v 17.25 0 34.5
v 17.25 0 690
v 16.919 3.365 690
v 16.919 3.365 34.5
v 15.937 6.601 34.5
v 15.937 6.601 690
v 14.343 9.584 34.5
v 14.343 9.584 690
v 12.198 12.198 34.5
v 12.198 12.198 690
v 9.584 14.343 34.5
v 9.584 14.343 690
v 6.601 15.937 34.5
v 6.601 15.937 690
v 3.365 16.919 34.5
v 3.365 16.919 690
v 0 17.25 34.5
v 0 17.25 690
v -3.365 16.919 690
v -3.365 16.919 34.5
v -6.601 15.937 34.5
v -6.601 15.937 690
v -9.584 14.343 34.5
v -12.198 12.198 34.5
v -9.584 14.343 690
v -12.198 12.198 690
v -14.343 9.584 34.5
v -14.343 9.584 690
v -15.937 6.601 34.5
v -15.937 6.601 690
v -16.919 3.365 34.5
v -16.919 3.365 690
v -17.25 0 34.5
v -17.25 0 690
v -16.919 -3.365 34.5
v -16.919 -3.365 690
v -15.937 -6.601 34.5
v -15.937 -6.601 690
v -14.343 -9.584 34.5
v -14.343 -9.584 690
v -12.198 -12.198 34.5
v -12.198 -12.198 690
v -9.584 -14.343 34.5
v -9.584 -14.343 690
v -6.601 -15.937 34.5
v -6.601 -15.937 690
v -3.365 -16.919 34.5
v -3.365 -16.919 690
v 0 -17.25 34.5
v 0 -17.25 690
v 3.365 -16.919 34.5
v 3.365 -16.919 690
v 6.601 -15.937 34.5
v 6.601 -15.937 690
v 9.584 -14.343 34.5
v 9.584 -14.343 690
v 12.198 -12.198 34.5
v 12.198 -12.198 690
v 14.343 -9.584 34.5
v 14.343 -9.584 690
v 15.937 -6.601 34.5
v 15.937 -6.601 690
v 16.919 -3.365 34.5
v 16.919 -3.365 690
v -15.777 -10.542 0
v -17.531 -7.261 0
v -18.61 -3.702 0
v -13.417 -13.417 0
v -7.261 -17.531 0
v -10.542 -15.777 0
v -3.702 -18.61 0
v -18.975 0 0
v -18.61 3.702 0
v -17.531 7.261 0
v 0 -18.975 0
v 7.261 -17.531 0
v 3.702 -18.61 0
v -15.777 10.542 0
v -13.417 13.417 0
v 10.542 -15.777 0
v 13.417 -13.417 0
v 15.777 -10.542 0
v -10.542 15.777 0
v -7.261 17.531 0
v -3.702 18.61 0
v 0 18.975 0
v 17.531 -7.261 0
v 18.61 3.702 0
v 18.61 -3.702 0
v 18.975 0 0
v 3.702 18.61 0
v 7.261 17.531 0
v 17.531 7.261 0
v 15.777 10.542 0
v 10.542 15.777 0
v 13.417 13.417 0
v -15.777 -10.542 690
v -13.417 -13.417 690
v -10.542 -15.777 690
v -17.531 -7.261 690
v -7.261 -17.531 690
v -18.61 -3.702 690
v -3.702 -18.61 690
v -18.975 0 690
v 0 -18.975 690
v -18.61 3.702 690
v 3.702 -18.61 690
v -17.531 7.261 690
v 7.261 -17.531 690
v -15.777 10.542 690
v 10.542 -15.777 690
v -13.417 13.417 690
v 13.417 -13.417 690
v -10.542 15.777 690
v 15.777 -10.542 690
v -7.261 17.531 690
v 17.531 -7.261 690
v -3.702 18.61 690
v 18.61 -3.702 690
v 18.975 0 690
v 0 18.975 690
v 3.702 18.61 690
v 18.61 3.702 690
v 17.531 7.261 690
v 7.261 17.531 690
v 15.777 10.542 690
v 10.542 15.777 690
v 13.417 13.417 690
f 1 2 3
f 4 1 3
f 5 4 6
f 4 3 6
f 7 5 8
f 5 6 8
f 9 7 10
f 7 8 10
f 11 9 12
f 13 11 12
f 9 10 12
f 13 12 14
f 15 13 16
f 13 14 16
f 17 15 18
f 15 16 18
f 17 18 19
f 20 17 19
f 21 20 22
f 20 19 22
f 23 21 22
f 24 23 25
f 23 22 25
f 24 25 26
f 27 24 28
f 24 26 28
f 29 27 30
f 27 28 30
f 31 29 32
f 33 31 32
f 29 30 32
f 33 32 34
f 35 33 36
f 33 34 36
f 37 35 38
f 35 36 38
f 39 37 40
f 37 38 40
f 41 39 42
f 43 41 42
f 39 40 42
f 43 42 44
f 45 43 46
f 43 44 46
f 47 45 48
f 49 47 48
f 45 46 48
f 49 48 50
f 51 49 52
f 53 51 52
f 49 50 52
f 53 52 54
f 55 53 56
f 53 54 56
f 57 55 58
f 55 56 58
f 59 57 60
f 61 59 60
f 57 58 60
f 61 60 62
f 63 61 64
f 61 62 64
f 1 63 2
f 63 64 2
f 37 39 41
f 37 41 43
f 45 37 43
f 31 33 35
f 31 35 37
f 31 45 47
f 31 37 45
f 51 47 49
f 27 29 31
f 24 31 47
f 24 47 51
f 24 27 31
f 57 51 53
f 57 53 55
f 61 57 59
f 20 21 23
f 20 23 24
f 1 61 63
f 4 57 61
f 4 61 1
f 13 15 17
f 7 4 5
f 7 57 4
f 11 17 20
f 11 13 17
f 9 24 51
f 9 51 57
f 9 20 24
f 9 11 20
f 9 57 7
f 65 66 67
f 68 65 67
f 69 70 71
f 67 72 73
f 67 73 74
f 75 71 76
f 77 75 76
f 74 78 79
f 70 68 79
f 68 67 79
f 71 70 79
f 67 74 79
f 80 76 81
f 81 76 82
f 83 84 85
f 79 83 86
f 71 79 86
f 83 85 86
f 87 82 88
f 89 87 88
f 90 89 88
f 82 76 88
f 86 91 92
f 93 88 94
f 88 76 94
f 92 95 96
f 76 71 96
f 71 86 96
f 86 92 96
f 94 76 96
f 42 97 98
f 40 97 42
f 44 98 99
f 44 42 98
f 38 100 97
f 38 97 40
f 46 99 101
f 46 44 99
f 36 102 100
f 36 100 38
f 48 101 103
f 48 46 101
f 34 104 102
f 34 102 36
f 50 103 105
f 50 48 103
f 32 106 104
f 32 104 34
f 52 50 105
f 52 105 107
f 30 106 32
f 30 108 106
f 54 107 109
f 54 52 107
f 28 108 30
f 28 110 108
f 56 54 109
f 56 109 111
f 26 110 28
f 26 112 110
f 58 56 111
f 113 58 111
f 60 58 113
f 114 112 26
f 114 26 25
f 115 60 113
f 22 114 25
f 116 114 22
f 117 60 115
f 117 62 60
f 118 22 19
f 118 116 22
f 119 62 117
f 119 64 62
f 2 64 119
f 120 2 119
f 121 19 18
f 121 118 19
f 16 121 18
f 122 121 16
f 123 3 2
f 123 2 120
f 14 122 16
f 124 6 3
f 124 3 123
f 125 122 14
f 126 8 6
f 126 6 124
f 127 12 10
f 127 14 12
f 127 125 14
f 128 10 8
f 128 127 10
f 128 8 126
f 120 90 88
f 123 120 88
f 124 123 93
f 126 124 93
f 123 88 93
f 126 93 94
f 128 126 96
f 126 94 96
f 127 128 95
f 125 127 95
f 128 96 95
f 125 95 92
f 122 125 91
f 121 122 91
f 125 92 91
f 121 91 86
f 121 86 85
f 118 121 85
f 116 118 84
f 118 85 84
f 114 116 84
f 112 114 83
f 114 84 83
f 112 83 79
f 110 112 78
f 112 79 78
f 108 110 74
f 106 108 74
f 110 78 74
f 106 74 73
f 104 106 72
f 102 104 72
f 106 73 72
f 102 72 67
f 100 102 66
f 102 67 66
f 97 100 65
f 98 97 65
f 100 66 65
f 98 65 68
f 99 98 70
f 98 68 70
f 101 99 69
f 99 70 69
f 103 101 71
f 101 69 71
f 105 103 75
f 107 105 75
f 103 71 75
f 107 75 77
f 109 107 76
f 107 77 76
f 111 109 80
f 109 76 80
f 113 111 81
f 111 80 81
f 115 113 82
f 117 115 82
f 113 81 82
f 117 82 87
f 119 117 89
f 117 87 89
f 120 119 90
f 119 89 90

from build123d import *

# Parameters (mm, degrees)
SKETCH_1_R          = 55
EXTRUDE_1_DEPTH     = 2000
SKETCH_2_R          = 50
CUT_EXTRUDE_1_DEPTH = 1900
SCALE_1_SCALE       = 0.345


with BuildPart() as part:
    # 草图1 → 凸台-拉伸1 (new body)
    with BuildSketch(Plane.XY):
        Circle(SKETCH_1_R)
    extrude(amount=EXTRUDE_1_DEPTH)

    # 草图2 → 切除-拉伸1 (cut)
    with BuildSketch(Plane.XY.offset(2000)):
        Circle(SKETCH_2_R)
    extrude(amount=-CUT_EXTRUDE_1_DEPTH, mode=Mode.SUBTRACT)


with BuildPart() as part_1:
    # 缩放比例1: scaled about (0, 0, 0)
    add(part.part.scale(SCALE_1_SCALE))


solid = part_1.part
